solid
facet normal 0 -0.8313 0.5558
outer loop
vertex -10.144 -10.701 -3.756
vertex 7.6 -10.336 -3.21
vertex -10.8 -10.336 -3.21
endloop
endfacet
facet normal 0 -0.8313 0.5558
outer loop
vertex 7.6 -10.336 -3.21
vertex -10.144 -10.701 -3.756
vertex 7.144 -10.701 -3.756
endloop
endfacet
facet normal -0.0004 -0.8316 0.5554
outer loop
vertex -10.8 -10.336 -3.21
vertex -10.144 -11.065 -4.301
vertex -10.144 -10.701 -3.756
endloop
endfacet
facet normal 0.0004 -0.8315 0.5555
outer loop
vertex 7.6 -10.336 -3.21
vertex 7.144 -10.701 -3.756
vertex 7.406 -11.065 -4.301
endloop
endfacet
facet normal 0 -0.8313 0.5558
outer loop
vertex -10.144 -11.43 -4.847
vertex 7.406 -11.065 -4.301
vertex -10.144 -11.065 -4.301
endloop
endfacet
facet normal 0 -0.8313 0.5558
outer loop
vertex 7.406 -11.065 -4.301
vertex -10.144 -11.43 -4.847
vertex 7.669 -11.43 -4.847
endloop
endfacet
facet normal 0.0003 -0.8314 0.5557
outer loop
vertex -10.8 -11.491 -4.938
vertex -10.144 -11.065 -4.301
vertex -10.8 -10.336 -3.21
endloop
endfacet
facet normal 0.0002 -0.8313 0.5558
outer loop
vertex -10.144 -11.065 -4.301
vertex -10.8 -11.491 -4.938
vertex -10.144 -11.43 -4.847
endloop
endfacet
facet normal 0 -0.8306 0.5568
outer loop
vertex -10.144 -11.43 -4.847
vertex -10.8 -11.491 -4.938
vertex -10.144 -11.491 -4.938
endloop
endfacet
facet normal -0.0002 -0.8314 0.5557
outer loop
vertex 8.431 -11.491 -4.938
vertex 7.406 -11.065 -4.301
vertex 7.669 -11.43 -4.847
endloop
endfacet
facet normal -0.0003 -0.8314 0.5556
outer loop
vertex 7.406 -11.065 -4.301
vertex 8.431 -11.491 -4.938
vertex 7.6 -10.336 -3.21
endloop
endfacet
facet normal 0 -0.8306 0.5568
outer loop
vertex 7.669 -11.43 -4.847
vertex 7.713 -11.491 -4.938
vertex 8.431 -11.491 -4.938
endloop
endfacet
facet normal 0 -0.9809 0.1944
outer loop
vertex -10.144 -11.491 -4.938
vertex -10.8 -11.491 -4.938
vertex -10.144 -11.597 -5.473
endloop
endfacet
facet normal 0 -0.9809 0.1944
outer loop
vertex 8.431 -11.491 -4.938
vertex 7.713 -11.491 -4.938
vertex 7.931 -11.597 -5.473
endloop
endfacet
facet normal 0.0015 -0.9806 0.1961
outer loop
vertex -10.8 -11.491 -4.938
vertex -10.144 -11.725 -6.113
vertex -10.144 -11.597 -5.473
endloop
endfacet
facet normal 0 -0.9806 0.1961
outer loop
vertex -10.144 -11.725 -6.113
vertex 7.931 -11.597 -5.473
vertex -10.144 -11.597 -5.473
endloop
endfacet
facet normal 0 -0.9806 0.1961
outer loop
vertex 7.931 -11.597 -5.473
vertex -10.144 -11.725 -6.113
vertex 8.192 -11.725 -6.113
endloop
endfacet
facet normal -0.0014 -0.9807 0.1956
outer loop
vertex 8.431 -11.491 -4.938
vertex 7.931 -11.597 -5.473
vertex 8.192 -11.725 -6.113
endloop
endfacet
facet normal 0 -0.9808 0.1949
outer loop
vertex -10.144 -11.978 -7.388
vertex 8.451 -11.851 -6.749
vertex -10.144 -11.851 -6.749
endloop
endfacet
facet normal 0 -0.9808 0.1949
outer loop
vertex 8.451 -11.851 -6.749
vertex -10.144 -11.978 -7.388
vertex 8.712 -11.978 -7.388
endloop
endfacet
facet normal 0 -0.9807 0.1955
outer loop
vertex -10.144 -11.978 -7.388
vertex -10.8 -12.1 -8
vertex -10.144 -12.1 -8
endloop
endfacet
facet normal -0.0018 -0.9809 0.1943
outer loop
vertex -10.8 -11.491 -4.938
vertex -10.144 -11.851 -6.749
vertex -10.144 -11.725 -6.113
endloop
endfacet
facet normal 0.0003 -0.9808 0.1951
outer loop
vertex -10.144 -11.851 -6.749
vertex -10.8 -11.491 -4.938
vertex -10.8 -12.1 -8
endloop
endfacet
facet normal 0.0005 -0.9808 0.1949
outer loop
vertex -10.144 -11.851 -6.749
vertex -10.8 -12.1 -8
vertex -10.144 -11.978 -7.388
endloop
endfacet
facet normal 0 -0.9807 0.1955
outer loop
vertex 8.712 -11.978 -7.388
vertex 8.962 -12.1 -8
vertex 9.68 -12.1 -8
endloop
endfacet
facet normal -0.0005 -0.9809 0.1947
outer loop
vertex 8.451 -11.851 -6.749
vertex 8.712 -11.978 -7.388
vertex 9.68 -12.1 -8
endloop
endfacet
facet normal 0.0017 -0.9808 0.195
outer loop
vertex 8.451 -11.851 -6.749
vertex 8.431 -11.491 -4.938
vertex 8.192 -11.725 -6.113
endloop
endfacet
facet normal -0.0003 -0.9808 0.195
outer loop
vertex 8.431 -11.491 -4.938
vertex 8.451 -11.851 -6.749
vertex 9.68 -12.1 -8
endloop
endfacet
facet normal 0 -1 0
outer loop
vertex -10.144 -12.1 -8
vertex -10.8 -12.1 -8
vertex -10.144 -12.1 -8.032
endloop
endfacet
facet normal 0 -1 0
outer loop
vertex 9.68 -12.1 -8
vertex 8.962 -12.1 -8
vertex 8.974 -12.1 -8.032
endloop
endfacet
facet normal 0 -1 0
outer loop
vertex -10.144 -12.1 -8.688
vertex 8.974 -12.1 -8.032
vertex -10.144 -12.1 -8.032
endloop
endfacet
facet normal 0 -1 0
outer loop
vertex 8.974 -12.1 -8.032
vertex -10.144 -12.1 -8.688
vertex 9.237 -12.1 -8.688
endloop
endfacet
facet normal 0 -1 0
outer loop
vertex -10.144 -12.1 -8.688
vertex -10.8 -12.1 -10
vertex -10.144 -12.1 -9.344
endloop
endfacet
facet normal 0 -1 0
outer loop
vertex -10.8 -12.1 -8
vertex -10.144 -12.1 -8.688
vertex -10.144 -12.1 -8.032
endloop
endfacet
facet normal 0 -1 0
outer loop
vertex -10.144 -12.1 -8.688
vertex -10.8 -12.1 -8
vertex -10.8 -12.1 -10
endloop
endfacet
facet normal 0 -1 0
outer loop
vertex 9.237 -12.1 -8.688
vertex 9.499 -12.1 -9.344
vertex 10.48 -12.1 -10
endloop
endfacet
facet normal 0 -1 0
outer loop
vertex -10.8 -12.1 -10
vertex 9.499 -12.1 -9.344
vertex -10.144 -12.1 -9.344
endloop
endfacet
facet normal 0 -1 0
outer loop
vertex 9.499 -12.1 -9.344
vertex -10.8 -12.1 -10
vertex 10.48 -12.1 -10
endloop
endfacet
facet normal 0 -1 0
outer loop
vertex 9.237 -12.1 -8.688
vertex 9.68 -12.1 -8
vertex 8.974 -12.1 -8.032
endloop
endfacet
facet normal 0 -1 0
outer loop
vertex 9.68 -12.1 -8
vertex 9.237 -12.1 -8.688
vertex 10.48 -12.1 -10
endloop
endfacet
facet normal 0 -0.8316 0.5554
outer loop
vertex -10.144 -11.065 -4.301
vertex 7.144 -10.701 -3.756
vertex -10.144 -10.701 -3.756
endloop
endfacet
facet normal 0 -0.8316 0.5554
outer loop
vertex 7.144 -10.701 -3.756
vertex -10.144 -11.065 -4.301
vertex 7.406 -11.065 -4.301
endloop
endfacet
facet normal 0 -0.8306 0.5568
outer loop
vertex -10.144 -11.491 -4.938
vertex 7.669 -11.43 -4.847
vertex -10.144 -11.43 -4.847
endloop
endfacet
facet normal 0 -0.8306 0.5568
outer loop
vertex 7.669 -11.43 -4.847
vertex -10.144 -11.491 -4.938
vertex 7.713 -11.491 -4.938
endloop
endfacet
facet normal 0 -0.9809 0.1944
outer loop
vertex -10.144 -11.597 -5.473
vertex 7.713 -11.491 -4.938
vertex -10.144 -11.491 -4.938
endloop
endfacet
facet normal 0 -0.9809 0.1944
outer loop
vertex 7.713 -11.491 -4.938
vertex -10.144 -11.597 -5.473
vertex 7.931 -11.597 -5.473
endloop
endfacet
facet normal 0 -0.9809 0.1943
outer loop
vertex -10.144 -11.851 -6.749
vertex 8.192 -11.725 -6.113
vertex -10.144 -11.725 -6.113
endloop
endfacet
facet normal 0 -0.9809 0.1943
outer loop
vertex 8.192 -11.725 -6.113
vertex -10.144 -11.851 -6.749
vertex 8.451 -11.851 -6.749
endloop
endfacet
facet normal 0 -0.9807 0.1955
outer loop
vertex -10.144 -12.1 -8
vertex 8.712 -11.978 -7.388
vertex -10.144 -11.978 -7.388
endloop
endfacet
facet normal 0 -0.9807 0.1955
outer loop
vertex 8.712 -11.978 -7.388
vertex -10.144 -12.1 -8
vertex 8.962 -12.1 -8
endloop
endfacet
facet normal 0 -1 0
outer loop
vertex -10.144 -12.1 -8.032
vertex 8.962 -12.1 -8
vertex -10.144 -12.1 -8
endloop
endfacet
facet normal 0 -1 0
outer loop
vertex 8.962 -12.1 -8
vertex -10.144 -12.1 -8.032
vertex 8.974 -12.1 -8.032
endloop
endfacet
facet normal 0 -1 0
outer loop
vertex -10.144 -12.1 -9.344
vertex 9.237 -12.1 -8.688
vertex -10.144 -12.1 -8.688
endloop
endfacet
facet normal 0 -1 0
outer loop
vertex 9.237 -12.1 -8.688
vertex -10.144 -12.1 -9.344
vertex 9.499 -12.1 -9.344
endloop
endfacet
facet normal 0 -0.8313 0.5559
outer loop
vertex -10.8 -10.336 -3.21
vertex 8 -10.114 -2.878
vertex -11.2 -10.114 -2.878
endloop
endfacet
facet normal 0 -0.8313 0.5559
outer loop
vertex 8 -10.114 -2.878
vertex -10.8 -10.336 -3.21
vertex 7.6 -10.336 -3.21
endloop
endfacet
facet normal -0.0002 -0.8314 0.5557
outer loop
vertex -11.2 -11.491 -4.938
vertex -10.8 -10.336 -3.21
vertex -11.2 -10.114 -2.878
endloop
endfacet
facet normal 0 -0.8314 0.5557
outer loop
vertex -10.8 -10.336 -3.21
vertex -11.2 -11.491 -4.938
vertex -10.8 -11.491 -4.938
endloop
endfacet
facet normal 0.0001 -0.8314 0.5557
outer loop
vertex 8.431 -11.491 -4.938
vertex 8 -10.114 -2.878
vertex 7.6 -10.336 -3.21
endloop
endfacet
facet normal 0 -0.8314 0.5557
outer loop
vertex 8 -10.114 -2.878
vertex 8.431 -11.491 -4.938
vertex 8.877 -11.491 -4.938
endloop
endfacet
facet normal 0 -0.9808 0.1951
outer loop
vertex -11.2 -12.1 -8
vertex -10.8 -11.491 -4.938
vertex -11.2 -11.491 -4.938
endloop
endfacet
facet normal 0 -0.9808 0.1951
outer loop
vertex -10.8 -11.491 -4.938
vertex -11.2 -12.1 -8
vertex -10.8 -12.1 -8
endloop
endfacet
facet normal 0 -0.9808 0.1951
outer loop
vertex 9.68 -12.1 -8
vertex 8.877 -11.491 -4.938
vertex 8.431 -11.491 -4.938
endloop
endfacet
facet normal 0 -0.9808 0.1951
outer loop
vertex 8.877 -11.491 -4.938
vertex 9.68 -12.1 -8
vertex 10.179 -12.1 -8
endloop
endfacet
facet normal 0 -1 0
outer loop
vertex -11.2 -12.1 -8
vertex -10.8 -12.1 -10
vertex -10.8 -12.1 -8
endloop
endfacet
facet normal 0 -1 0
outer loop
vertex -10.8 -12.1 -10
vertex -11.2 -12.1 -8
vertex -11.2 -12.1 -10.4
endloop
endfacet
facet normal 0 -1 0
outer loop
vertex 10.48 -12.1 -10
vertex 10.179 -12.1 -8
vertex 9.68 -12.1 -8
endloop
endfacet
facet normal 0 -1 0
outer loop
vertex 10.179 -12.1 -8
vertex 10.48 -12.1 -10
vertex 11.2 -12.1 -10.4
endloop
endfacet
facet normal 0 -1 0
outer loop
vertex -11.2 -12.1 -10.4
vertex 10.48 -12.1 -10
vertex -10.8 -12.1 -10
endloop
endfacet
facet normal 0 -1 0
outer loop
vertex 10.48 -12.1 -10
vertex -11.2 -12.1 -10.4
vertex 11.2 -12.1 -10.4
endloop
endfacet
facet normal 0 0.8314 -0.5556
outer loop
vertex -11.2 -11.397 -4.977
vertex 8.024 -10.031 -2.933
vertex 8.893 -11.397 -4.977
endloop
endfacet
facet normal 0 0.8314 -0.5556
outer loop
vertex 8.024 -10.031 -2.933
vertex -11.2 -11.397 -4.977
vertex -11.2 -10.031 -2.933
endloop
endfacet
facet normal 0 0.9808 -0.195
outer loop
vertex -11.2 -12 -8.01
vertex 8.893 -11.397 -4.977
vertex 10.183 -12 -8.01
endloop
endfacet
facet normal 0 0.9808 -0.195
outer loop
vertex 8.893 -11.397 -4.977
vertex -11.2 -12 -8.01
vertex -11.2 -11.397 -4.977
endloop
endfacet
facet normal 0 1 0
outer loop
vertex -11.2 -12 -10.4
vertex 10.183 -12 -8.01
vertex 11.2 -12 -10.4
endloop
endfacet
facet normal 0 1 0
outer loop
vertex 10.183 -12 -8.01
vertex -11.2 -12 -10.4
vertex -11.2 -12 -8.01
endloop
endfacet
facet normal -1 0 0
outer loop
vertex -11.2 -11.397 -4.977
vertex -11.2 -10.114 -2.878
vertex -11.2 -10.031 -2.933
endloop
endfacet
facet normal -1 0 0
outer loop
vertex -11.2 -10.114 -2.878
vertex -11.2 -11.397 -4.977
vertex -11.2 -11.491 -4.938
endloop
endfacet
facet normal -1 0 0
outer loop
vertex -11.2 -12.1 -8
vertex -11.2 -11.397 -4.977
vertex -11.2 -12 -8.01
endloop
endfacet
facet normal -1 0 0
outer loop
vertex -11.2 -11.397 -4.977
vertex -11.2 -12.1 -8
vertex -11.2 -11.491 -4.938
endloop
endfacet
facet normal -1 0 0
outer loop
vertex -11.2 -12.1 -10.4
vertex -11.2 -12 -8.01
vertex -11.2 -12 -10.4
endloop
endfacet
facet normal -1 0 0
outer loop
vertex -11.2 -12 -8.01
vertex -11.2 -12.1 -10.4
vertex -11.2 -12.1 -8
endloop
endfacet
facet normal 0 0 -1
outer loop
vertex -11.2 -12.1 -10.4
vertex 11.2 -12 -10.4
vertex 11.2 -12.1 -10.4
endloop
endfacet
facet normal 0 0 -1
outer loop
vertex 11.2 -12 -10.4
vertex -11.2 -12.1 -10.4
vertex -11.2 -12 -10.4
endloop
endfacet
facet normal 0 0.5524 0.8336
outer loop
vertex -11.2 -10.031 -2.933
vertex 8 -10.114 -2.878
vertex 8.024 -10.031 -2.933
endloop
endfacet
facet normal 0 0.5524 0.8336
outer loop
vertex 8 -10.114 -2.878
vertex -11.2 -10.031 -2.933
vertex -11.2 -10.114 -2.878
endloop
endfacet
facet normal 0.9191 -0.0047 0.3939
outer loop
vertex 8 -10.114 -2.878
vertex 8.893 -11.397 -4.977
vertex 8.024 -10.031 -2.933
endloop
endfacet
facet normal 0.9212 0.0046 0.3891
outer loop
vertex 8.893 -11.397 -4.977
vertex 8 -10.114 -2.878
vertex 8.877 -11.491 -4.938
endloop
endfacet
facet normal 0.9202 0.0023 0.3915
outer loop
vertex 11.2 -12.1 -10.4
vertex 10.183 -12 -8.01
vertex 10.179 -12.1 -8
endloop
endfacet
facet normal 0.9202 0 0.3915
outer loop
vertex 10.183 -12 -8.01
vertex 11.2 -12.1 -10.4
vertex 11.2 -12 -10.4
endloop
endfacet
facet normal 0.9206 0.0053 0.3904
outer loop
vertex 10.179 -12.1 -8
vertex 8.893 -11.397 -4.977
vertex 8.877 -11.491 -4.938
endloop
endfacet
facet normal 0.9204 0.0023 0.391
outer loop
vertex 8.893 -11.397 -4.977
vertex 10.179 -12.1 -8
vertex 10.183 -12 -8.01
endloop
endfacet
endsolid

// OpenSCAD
use <../lib.scad>
function ldraw_lib__821472hc01() = [
// 0 Sticker  1.0 x  2.8 with Black and Light Grey Grid on Transparent Background (Right) (Formed)
// 0 Name: 821472hc01.dat
// 0 Author: Damien Roux [Darats]
// 0 !LDRAW_ORG Part UPDATE 2016-01
// 0 !LICENSE Licensed under CC BY 4.0 : see CAreadme.txt
// 
// 0 BFC CERTIFY CCW
  [0,"BFC","CERTIFY"],
  [0,"BFC","CCW"],
// 
// 0 !HISTORY 2016-12-31 [PTadmin] Official Update 2016-01
// 
// 
// 4 0 -25.36 9.38926 -26.7519 17.86 9.38926 -26.7519 19 8.02564 -25.8408 -27 8.02564 -25.8408
  [4,0,-25.36,9.38926,-26.7519,17.86,9.38926,-26.7519,19,8.02564,-25.8408,-27,8.02564,-25.8408],
// 3 0 -27 8.02564 -25.8408 -25.36 10.7529 -27.663 -25.36 9.38926 -26.7519
  [3,0,-27,8.02564,-25.8408,-25.36,10.7529,-27.663,-25.36,9.38926,-26.7519],
// 3 0 19 8.02564 -25.8408 17.86 9.38926 -26.7519 18.516 10.7529 -27.663
  [3,0,19,8.02564,-25.8408,17.86,9.38926,-26.7519,18.516,10.7529,-27.663],
// 4 0 18.516 10.7529 -27.663 -25.36 10.7529 -27.663 -25.36 12.1165 -28.5742 19.172 12.1165 -28.5742
  [4,0,18.516,10.7529,-27.663,-25.36,10.7529,-27.663,-25.36,12.1165,-28.5742,19.172,12.1165,-28.5742],
// 4 0 -25.36 12.1165 -28.5742 -25.36 10.7529 -27.663 -27 8.02564 -25.8408 -27 12.346 -28.7275
  [4,0,-25.36,12.1165,-28.5742,-25.36,10.7529,-27.663,-27,8.02564,-25.8408,-27,12.346,-28.7275],
// 3 0 -25.36 12.1165 -28.5742 -27 12.346 -28.7275 -25.36 12.346 -28.7276
  [3,0,-25.36,12.1165,-28.5742,-27,12.346,-28.7275,-25.36,12.346,-28.7276],
// 4 0 19 8.02564 -25.8408 18.516 10.7529 -27.663 19.172 12.1165 -28.5742 21.0784 12.346 -28.7276
  [4,0,19,8.02564,-25.8408,18.516,10.7529,-27.663,19.172,12.1165,-28.5742,21.0784,12.346,-28.7276],
// 3 0 19.172 12.1165 -28.5742 19.2824 12.346 -28.7276 21.0784 12.346 -28.7276
  [3,0,19.172,12.1165,-28.5742,19.2824,12.346,-28.7276,21.0784,12.346,-28.7276],
// 3 0 -25.36 12.346 -28.7275 -27 12.346 -28.7275 -25.36 13.6837 -28.9936
  [3,0,-25.36,12.346,-28.7275,-27,12.346,-28.7275,-25.36,13.6837,-28.9936],
// 3 0 21.0784 12.346 -28.7275 19.2824 12.346 -28.7275 19.828 13.6837 -28.9936
  [3,0,21.0784,12.346,-28.7275,19.2824,12.346,-28.7275,19.828,13.6837,-28.9936],
// 3 0 -27 12.346 -28.7275 -25.36 15.2824 -29.3116 -25.36 13.6837 -28.9936
  [3,0,-27,12.346,-28.7275,-25.36,15.2824,-29.3116,-25.36,13.6837,-28.9936],
// 4 0 19.828 13.6837 -28.9936 -25.36 13.6837 -28.9936 -25.36 15.2824 -29.3116 20.48 15.2824 -29.3116
  [4,0,19.828,13.6837,-28.9936,-25.36,13.6837,-28.9936,-25.36,15.2824,-29.3116,20.48,15.2824,-29.3116],
// 3 0 21.0784 12.346 -28.7275 19.828 13.6837 -28.9936 20.48 15.2824 -29.3116
  [3,0,21.0784,12.346,-28.7275,19.828,13.6837,-28.9936,20.48,15.2824,-29.3116],
// 4 0 21.128 16.8713 -29.6277 -25.36 16.8713 -29.6277 -25.36 18.47 -29.9457 21.78 18.47 -29.9457
  [4,0,21.128,16.8713,-29.6277,-25.36,16.8713,-29.6277,-25.36,18.47,-29.9457,21.78,18.47,-29.9457],
// 3 0 -25.36 18.47 -29.9457 -27 20 -30.25 -25.36 20 -30.25
  [3,0,-25.36,18.47,-29.9457,-27,20,-30.25,-25.36,20,-30.25],
// 4 0 -27 20 -30.25 -25.36 16.8713 -29.6277 -25.36 15.2824 -29.3116 -27 12.346 -28.7275
  [4,0,-27,20,-30.25,-25.36,16.8713,-29.6277,-25.36,15.2824,-29.3116,-27,12.346,-28.7275],
// 3 0 -25.36 16.8713 -29.6277 -27 20 -30.25 -25.36 18.47 -29.9457
  [3,0,-25.36,16.8713,-29.6277,-27,20,-30.25,-25.36,18.47,-29.9457],
// 3 0 21.78 18.47 -29.9457 22.404 20 -30.25 24.2 20 -30.25
  [3,0,21.78,18.47,-29.9457,22.404,20,-30.25,24.2,20,-30.25],
// 3 0 21.128 16.8713 -29.6277 21.78 18.47 -29.9457 24.2 20 -30.25
  [3,0,21.128,16.8713,-29.6277,21.78,18.47,-29.9457,24.2,20,-30.25],
// 4 0 20.48 15.2824 -29.3116 21.128 16.8713 -29.6277 24.2 20 -30.25 21.0784 12.346 -28.7275
  [4,0,20.48,15.2824,-29.3116,21.128,16.8713,-29.6277,24.2,20,-30.25,21.0784,12.346,-28.7275],
// 3 0 -25.36 20 -30.25 -27 20 -30.25 -25.36 20.08 -30.25
  [3,0,-25.36,20,-30.25,-27,20,-30.25,-25.36,20.08,-30.25],
// 3 0 24.2 20 -30.25 22.404 20 -30.25 22.436 20.08 -30.25
  [3,0,24.2,20,-30.25,22.404,20,-30.25,22.436,20.08,-30.25],
// 4 0 22.436 20.08 -30.25 -25.36 20.08 -30.25 -25.36 21.72 -30.25 23.092 21.72 -30.25
  [4,0,22.436,20.08,-30.25,-25.36,20.08,-30.25,-25.36,21.72,-30.25,23.092,21.72,-30.25],
// 3 0 -25.36 21.72 -30.25 -27 25 -30.25 -25.36 23.36 -30.25
  [3,0,-25.36,21.72,-30.25,-27,25,-30.25,-25.36,23.36,-30.25],
// 4 0 -27 25 -30.25 -25.36 21.72 -30.25 -25.36 20.08 -30.25 -27 20 -30.25
  [4,0,-27,25,-30.25,-25.36,21.72,-30.25,-25.36,20.08,-30.25,-27,20,-30.25],
// 3 0 23.092 21.72 -30.25 23.748 23.36 -30.25 26.2 25 -30.25
  [3,0,23.092,21.72,-30.25,23.748,23.36,-30.25,26.2,25,-30.25],
// 4 0 23.748 23.36 -30.25 -25.36 23.36 -30.25 -27 25 -30.25 26.2 25 -30.25
  [4,0,23.748,23.36,-30.25,-25.36,23.36,-30.25,-27,25,-30.25,26.2,25,-30.25],
// 4 0 22.436 20.08 -30.25 23.092 21.72 -30.25 26.2 25 -30.25 24.2 20 -30.25
  [4,0,22.436,20.08,-30.25,23.092,21.72,-30.25,26.2,25,-30.25,24.2,20,-30.25],
// 4 7 17.86 9.38926 -26.7519 -25.36 9.38926 -26.7519 -25.36 10.7529 -27.663 18.516 10.7529 -27.663
  [4,7,17.86,9.38926,-26.7519,-25.36,9.38926,-26.7519,-25.36,10.7529,-27.663,18.516,10.7529,-27.663],
// 4 7 19.172 12.1165 -28.5742 -25.36 12.1165 -28.5742 -25.36 12.346 -28.7276 19.2824 12.346 -28.7276
  [4,7,19.172,12.1165,-28.5742,-25.36,12.1165,-28.5742,-25.36,12.346,-28.7276,19.2824,12.346,-28.7276],
// 4 7 -25.36 12.346 -28.7275 -25.36 13.6837 -28.9936 19.828 13.6837 -28.9936 19.2824 12.346 -28.7275
  [4,7,-25.36,12.346,-28.7275,-25.36,13.6837,-28.9936,19.828,13.6837,-28.9936,19.2824,12.346,-28.7275],
// 4 7 20.48 15.2824 -29.3116 -25.36 15.2824 -29.3116 -25.36 16.8713 -29.6277 21.128 16.8713 -29.6277
  [4,7,20.48,15.2824,-29.3116,-25.36,15.2824,-29.3116,-25.36,16.8713,-29.6277,21.128,16.8713,-29.6277],
// 4 7 21.78 18.47 -29.9457 -25.36 18.47 -29.9457 -25.36 20 -30.25 22.404 20 -30.25
  [4,7,21.78,18.47,-29.9457,-25.36,18.47,-29.9457,-25.36,20,-30.25,22.404,20,-30.25],
// 4 7 -25.36 20 -30.25 -25.36 20.08 -30.25 22.436 20.08 -30.25 22.404 20 -30.25
  [4,7,-25.36,20,-30.25,-25.36,20.08,-30.25,22.436,20.08,-30.25,22.404,20,-30.25],
// 4 7 23.092 21.72 -30.25 -25.36 21.72 -30.25 -25.36 23.36 -30.25 23.748 23.36 -30.25
  [4,7,23.092,21.72,-30.25,-25.36,21.72,-30.25,-25.36,23.36,-30.25,23.748,23.36,-30.25],
// 4 16 19 8.02564 -25.8408 20 7.19418 -25.2852 -28 7.19418 -25.2852 -27 8.02564 -25.8408
  [4,16,19,8.02564,-25.8408,20,7.19418,-25.2852,-28,7.19418,-25.2852,-27,8.02564,-25.8408],
// 4 16 -27 8.02564 -25.8408 -28 7.19418 -25.2852 -28 12.346 -28.7275 -27 12.346 -28.7275
  [4,16,-27,8.02564,-25.8408,-28,7.19418,-25.2852,-28,12.346,-28.7275,-27,12.346,-28.7275],
// 4 16 22.1928 12.346 -28.7276 20 7.19418 -25.2852 19 8.02564 -25.8408 21.0784 12.346 -28.7276
  [4,16,22.1928,12.346,-28.7276,20,7.19418,-25.2852,19,8.02564,-25.8408,21.0784,12.346,-28.7276],
// 4 16 -28 12.346 -28.7275 -28 20 -30.25 -27 20 -30.25 -27 12.346 -28.7275
  [4,16,-28,12.346,-28.7275,-28,20,-30.25,-27,20,-30.25,-27,12.346,-28.7275],
// 4 16 21.0784 12.346 -28.7275 24.2 20 -30.25 25.4464 20 -30.25 22.1928 12.346 -28.7275
  [4,16,21.0784,12.346,-28.7275,24.2,20,-30.25,25.4464,20,-30.25,22.1928,12.346,-28.7275],
// 
// 4 16 -28 20 -30.25 -28 26 -30.25 -27 25 -30.25 -27 20 -30.25
  [4,16,-28,20,-30.25,-28,26,-30.25,-27,25,-30.25,-27,20,-30.25],
// 4 16 26.2 25 -30.25 28 26 -30.25 25.4464 20 -30.25 24.2 20 -30.25
  [4,16,26.2,25,-30.25,28,26,-30.25,25.4464,20,-30.25,24.2,20,-30.25],
// 4 16 26.2 25 -30.25 -27 25 -30.25 -28 26 -30.25 28 26 -30.25
  [4,16,26.2,25,-30.25,-27,25,-30.25,-28,26,-30.25,28,26,-30.25],
// 4 16 20.0591 7.33307 -25.0773 22.2318 12.4435 -28.492 -28 12.4435 -28.492 -28 7.33307 -25.0773
  [4,16,20.0591,7.33307,-25.0773,22.2318,12.4435,-28.492,-28,12.4435,-28.492,-28,7.33307,-25.0773],
// 4 16 22.2318 12.4435 -28.492 25.4571 20.0247 -30 -28 20.0247 -30 -28 12.4435 -28.492
  [4,16,22.2318,12.4435,-28.492,25.4571,20.0247,-30,-28,20.0247,-30,-28,12.4435,-28.492],
// 4 16 25.4571 20.0247 -30 28 26 -30 -28 26 -30 -28 20.0247 -30
  [4,16,25.4571,20.0247,-30,28,26,-30,-28,26,-30,-28,20.0247,-30],
// 4 16 -28 7.19418 -25.2852 -28 7.33307 -25.0773 -28 12.4435 -28.492 -28 12.346 -28.7275
  [4,16,-28,7.19418,-25.2852,-28,7.33307,-25.0773,-28,12.4435,-28.492,-28,12.346,-28.7275],
// 4 16 -28 12.4435 -28.492 -28 20.0247 -30 -28 20 -30.25 -28 12.346 -28.7275
  [4,16,-28,12.4435,-28.492,-28,20.0247,-30,-28,20,-30.25,-28,12.346,-28.7275],
// 4 16 -28 20 -30.25 -28 20.0247 -30 -28 26 -30 -28 26 -30.25
  [4,16,-28,20,-30.25,-28,20.0247,-30,-28,26,-30,-28,26,-30.25],
// 4 16 -28 26 -30.25 -28 26 -30 28 26 -30 28 26 -30.25
  [4,16,-28,26,-30.25,-28,26,-30,28,26,-30,28,26,-30.25],
// 4 16 20.0591 7.33307 -25.0773 -28 7.33307 -25.0773 -28 7.19418 -25.2852 20 7.19418 -25.2852
  [4,16,20.0591,7.33307,-25.0773,-28,7.33307,-25.0773,-28,7.19418,-25.2852,20,7.19418,-25.2852],
// 4 16 22.1928 12.346 -28.7276 22.2318 12.4435 -28.492 20.0591 7.33307 -25.0773 20 7.19418 -25.2852
  [4,16,22.1928,12.346,-28.7276,22.2318,12.4435,-28.492,20.0591,7.33307,-25.0773,20,7.19418,-25.2852],
// 4 16 28 26 -30.25 28 26 -30 25.4571 20.0247 -30 25.4464 20 -30.25
  [4,16,28,26,-30.25,28,26,-30,25.4571,20.0247,-30,25.4464,20,-30.25],
// 4 16 25.4464 20 -30.25 25.4571 20.0247 -30 22.2318 12.4435 -28.492 22.1928 12.346 -28.7276
  [4,16,25.4464,20,-30.25,25.4571,20.0247,-30,22.2318,12.4435,-28.492,22.1928,12.346,-28.7276],
// 0 // Condlines
// 5 24 -28 12.346 -28.7276 22.1928 12.346 -28.7275 -27 8.02564 -25.8408 -28 20 -30.25
  [5,24,-28,12.346,-28.7276,22.1928,12.346,-28.7275,-27,8.02564,-25.8408,-28,20,-30.25],
// 5 24 -28 20 -30.25 25.4464 20 -30.25 -28 12.346 -28.7275 -28 26 -30.25
  [5,24,-28,20,-30.25,25.4464,20,-30.25,-28,12.346,-28.7275,-28,26,-30.25],
];
module ldraw_lib__821472hc01(step=0, col=false, unit=2/5, alt=false, line=0.2, solid=!$preview)
    makepoly(ldraw_lib__821472hc01(), step=step, col=col, unit=unit, alt=alt, line=line, solid=solid);
ldraw_lib__821472hc01(line=0.2);
